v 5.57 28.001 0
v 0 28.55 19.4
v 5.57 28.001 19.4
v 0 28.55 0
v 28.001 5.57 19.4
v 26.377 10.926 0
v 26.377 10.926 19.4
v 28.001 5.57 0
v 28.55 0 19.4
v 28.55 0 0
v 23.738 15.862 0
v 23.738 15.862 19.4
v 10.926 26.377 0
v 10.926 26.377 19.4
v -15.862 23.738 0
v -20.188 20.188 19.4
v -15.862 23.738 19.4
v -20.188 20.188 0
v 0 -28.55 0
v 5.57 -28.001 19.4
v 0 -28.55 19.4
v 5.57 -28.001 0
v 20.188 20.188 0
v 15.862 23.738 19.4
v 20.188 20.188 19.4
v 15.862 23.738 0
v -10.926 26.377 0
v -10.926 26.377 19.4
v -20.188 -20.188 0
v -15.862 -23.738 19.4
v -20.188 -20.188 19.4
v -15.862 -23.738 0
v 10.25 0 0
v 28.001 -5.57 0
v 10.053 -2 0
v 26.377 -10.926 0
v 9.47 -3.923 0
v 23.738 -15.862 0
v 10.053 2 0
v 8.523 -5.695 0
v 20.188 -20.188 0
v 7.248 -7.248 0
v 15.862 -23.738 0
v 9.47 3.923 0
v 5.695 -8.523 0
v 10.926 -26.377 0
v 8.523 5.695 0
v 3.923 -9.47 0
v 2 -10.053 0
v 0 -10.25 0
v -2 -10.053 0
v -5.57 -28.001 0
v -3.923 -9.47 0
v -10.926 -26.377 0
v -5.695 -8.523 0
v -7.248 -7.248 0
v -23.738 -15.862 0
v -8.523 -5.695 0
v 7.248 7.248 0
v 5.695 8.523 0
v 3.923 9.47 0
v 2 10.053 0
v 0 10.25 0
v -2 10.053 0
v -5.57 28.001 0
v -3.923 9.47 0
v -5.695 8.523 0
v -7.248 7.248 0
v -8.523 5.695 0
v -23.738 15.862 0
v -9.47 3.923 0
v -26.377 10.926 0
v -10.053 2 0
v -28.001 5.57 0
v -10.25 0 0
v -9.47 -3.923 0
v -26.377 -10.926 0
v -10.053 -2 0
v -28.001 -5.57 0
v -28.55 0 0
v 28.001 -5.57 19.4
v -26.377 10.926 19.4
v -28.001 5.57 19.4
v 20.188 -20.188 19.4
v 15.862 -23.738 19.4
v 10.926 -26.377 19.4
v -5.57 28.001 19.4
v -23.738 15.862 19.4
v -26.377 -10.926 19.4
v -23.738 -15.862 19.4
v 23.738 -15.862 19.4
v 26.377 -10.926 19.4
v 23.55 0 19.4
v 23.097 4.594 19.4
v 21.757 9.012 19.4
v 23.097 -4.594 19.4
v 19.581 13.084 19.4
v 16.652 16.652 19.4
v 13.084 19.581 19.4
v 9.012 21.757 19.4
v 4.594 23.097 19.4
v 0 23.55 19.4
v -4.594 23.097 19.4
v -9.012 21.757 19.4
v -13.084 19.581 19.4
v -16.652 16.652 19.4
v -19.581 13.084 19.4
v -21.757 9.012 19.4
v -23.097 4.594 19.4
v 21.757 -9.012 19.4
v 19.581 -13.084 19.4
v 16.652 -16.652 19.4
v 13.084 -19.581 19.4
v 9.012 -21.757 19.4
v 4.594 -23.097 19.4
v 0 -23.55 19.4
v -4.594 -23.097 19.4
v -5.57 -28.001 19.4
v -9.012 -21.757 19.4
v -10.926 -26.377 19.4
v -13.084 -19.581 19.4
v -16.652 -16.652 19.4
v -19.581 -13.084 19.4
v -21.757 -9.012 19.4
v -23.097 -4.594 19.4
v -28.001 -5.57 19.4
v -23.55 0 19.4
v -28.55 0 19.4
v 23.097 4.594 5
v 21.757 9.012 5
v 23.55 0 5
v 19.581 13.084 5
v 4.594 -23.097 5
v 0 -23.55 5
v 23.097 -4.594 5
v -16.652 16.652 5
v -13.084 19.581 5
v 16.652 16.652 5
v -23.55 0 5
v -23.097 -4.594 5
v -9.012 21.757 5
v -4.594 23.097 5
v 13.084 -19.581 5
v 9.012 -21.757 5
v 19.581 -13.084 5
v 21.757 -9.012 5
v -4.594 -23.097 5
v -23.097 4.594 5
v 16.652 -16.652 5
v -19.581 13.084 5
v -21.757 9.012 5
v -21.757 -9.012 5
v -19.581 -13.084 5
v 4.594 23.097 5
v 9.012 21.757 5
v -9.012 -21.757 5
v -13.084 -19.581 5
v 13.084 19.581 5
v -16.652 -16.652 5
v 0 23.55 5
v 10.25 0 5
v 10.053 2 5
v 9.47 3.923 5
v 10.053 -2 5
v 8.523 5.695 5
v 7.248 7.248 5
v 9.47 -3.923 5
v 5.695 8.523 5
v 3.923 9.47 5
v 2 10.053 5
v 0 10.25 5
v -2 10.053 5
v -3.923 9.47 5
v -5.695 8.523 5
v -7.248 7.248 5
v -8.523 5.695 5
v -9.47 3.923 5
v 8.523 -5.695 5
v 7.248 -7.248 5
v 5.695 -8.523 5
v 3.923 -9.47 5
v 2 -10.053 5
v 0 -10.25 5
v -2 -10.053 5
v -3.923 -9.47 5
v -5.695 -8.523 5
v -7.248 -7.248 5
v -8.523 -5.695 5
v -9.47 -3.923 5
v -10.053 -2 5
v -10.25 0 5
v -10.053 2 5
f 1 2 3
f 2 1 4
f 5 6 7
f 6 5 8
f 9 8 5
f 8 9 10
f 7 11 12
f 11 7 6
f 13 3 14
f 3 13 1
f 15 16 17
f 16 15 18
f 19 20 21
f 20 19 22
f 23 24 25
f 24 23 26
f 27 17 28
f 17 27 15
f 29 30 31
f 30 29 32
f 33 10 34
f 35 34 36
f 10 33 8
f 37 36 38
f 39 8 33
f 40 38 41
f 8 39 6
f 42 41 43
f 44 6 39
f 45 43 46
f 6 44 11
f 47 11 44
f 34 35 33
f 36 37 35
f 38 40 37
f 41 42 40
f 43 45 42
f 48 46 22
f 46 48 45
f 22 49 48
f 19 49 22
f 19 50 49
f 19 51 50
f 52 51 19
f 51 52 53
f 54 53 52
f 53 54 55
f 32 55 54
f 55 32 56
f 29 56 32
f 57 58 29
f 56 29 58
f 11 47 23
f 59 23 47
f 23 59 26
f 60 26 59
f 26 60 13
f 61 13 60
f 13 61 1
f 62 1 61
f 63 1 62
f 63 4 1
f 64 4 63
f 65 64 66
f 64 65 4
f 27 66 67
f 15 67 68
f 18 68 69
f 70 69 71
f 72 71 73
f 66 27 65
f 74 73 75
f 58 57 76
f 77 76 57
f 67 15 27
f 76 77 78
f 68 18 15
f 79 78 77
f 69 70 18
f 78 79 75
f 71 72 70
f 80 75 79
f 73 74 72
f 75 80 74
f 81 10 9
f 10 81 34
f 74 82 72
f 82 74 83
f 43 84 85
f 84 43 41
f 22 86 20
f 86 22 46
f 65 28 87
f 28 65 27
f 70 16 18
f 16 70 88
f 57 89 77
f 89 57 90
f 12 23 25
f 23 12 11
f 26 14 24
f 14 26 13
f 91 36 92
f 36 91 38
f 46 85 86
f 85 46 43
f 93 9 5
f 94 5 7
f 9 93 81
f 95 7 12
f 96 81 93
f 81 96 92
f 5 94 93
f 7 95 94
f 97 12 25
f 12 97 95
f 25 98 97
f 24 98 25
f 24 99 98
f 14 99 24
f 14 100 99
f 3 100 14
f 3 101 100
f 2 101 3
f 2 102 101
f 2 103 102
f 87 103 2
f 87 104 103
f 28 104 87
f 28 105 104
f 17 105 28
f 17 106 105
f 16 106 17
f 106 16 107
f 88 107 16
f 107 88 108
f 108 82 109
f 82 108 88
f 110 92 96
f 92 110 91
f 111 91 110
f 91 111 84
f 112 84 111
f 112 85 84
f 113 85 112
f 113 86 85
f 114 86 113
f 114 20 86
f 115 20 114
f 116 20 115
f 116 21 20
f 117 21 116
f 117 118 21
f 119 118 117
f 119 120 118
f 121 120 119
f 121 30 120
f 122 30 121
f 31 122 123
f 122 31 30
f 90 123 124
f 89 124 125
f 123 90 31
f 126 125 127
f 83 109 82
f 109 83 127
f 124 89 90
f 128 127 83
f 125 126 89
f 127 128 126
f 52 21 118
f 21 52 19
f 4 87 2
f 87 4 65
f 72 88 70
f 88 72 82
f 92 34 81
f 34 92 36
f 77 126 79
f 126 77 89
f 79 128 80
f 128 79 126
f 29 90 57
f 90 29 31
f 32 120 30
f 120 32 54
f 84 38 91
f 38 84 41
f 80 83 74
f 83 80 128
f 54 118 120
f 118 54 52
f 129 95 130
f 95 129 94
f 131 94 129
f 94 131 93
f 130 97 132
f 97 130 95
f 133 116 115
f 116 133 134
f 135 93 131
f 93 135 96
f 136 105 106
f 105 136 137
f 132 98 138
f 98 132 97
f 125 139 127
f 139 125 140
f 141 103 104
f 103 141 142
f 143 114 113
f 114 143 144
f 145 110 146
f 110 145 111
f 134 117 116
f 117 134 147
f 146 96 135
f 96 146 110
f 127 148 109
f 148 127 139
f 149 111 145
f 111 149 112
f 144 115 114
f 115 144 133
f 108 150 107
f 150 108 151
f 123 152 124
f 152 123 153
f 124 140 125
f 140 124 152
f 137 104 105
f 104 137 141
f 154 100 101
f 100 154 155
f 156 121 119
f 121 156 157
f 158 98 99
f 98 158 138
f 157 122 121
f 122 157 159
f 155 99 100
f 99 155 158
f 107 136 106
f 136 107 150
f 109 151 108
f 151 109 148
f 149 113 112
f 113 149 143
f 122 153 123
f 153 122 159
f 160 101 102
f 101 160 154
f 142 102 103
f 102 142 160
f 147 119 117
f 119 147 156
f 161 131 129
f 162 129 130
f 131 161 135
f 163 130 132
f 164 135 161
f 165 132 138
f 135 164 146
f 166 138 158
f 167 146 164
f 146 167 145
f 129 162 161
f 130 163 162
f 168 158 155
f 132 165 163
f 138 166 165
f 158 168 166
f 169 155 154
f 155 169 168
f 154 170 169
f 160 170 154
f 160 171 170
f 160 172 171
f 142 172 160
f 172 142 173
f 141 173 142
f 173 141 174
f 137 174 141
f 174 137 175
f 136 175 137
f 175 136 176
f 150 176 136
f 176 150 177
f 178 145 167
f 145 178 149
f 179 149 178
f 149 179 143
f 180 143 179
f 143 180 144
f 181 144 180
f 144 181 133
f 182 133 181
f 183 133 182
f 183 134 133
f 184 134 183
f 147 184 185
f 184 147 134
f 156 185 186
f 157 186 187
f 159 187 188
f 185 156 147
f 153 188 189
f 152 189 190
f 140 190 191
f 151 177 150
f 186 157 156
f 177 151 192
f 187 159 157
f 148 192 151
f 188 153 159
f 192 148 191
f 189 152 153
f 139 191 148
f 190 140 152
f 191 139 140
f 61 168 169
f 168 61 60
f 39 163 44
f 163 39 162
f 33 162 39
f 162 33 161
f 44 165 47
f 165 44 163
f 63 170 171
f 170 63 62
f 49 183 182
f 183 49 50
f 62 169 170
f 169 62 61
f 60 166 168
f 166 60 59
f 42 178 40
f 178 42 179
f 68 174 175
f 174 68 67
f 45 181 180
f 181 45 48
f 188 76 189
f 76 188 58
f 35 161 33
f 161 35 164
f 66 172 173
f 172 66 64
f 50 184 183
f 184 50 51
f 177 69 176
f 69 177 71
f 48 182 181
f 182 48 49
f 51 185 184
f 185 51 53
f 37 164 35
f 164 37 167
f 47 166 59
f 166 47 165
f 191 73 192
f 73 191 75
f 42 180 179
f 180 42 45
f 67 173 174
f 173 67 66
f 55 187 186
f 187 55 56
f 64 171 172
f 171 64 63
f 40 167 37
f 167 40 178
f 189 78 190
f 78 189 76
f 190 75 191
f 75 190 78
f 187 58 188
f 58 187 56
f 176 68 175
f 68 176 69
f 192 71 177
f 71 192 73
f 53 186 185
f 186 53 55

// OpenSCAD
$fn = 32;

// ----------------------------------------------------------------------
// Bearing housing: seat for 6204 (47 x 14 mm), 57.1 mm body
// ----------------------------------------------------------------------

// --- parameters (mm) ---
housing_d = 57.1;         // housing outside diameter
housing_h = 19.4;         // overall housing height
wall_t = 5;               // wall thickness
seat_d = 47.1;            // 6204 seat, 0.1 mm clearance
seat_h = 14.4;            // pocket depth
shoulder = 5;             // shoulder under the bearing
pass_d = 20.5;            // shaft passage

module body() {
  cylinder(h = housing_h, d = housing_d);
}

difference() {
  union() {
    body();
  }
  translate([0, 0, housing_h - seat_h]) cylinder(h = seat_h + 1, d = seat_d);
  translate([0, 0, -1]) cylinder(h = housing_h - seat_h + 1, d = pass_d);
}
